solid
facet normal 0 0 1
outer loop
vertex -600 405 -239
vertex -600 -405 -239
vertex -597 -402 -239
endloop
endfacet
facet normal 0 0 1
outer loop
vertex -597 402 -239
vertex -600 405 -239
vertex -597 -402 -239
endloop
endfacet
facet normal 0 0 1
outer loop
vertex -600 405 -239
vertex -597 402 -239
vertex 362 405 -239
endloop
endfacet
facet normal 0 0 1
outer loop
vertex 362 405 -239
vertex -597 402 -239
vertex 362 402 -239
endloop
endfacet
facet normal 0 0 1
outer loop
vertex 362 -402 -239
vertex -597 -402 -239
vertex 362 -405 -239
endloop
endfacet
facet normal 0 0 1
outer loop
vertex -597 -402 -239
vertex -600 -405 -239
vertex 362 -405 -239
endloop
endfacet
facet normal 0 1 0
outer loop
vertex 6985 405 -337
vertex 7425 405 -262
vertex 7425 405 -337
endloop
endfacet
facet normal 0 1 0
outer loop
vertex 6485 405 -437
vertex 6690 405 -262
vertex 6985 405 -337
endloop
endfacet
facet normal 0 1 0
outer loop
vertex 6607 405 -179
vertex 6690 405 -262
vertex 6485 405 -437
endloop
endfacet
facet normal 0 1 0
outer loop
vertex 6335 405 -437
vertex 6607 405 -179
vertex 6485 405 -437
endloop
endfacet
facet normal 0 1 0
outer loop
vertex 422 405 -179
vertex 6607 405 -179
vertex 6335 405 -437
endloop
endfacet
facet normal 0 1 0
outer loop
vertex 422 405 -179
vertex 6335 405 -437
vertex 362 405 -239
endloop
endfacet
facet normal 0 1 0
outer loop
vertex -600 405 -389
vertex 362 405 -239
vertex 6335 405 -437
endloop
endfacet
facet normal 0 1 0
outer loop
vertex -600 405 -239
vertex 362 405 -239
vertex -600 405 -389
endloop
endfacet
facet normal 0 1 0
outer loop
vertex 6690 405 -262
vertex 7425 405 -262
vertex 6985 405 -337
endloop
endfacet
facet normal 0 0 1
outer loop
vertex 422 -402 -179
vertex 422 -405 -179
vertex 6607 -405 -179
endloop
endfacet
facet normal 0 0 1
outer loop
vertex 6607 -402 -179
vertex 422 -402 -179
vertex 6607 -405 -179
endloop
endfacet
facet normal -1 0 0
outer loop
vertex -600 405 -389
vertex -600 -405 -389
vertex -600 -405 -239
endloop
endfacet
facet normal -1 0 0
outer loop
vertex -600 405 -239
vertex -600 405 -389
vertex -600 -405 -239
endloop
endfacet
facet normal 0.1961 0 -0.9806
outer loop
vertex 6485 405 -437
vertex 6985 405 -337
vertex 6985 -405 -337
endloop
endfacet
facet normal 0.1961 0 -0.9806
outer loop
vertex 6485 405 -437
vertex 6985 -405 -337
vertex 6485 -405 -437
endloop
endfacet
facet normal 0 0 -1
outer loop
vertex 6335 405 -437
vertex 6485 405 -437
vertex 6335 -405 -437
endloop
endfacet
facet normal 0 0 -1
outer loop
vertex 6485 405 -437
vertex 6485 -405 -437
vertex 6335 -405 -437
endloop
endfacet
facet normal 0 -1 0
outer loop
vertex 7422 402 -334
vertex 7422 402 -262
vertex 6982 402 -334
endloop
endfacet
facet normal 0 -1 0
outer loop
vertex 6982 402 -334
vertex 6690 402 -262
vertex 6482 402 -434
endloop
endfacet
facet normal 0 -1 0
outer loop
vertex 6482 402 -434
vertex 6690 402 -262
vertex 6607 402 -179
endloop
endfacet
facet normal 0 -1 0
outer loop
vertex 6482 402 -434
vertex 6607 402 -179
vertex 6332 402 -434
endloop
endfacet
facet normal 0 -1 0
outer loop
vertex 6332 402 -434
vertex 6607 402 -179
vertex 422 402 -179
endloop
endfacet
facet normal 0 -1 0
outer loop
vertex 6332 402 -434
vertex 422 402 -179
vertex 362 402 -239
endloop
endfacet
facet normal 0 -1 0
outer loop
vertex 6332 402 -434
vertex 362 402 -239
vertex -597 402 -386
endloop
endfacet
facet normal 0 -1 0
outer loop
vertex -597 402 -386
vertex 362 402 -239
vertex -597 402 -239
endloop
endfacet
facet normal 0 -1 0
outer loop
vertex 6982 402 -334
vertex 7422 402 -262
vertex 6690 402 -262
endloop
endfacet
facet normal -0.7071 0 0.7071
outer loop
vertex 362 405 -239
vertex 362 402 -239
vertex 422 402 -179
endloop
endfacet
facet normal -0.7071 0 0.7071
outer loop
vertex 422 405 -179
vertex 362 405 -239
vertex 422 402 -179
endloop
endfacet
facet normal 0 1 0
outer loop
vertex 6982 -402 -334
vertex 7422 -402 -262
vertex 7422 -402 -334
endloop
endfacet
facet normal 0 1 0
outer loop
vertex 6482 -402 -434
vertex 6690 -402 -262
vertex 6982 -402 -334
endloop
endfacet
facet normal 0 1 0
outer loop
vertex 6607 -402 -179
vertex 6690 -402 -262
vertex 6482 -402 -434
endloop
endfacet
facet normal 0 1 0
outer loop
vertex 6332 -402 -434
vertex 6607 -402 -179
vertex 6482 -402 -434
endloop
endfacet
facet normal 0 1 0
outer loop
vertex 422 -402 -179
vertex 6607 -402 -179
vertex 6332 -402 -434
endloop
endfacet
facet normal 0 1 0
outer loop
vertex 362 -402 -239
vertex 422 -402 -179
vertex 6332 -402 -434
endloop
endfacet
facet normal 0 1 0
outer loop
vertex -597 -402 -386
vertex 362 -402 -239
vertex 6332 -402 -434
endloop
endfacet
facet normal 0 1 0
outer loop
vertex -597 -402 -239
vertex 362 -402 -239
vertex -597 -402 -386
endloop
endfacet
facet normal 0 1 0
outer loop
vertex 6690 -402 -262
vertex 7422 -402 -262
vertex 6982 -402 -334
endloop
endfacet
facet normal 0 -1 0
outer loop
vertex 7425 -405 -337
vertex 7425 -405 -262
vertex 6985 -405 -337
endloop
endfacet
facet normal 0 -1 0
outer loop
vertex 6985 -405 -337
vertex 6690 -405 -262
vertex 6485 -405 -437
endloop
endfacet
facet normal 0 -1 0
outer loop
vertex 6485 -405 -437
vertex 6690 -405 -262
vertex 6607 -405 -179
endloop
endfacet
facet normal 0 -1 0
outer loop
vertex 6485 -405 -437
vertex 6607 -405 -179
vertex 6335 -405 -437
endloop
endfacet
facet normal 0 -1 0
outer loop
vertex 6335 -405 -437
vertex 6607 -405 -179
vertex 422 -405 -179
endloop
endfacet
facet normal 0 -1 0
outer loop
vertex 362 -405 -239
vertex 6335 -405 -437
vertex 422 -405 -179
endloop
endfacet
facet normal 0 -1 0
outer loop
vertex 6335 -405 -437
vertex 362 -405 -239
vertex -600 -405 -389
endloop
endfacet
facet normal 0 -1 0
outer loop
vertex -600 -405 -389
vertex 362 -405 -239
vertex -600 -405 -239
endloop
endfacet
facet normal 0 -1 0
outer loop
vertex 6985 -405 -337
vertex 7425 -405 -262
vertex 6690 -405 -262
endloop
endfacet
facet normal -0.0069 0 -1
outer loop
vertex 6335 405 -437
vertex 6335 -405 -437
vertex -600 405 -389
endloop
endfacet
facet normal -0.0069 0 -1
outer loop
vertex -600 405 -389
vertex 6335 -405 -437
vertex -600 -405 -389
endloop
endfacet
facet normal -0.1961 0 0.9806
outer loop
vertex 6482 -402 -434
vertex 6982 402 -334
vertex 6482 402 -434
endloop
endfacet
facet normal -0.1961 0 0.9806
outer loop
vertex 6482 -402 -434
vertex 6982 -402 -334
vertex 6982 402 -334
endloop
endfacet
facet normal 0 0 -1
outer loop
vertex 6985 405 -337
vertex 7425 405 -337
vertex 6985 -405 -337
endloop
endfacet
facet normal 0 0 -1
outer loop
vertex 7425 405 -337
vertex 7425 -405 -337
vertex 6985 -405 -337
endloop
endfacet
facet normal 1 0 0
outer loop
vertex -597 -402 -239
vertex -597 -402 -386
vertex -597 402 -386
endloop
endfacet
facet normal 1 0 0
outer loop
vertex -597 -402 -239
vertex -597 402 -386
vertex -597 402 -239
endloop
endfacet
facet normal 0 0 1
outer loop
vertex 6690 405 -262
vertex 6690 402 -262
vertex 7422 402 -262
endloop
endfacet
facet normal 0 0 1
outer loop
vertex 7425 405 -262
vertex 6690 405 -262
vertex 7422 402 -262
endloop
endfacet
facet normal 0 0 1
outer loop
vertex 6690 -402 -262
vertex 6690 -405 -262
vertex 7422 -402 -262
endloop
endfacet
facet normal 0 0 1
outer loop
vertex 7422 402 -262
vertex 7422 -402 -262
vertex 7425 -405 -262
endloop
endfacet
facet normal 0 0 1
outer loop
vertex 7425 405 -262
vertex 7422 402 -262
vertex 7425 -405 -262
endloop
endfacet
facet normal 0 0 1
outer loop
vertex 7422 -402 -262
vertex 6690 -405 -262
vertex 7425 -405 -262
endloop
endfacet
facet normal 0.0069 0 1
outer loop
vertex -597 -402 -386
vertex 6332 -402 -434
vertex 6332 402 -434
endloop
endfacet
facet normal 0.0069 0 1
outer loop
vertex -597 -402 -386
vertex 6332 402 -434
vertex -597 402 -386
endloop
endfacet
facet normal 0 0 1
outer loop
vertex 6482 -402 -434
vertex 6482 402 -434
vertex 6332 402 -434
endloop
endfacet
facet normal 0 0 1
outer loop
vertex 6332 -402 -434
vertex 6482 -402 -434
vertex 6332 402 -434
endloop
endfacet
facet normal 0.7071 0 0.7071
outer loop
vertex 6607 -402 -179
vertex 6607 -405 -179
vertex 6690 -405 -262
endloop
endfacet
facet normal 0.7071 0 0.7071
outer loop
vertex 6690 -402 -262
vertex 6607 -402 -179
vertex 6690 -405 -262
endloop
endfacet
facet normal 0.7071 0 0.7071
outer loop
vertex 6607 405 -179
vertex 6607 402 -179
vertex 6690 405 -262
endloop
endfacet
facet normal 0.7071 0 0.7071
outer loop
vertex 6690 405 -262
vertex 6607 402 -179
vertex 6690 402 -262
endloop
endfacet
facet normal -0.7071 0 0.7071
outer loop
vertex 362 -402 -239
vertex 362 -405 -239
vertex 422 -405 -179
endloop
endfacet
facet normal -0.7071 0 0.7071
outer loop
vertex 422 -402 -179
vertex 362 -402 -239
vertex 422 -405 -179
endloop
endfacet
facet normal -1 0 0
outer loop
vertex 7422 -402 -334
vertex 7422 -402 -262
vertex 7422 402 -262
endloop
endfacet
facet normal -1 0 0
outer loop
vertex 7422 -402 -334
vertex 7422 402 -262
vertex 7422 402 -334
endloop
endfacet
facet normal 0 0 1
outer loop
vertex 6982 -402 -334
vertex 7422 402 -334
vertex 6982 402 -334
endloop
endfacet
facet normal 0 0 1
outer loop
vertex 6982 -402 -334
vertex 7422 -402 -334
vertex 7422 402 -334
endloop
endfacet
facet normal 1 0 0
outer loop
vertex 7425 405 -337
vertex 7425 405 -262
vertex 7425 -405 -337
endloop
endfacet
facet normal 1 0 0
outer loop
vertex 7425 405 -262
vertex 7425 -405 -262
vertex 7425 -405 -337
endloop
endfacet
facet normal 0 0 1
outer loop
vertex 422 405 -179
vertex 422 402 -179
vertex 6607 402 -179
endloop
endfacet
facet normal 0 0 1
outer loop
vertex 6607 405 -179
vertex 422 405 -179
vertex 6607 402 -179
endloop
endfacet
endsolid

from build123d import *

# Parameters (mm, degrees)
EXTRUDE032_DEPTH = 402
EXTRUDE015_DEPTH = 405


with BuildPart() as extrude032:
    # Sketch033 → Extrude032 (new body, symmetric)
    with BuildSketch(Plane.XZ):
        Polygon((-597, -239), (362, -239), (422, -179), (6604, -179), (6687, -262), (7422, -262), (7422, -337), (6982, -337), (6482, -437), (6332, -437), (-597, -389), align=None)
    extrude(amount=EXTRUDE032_DEPTH, both=True)


with BuildPart() as extrude032_1:
    # Extrude032 placement: moved
    add(extrude032.part.moved(Location((0, 0, 3))))


with BuildPart() as cut:
    # Sketch023 → Extrude015 (new body, symmetric)
    with BuildSketch(Plane.XZ):
        Polygon((-600, -239), (362, -239), (422, -179), (6607, -179), (6690, -262), (7425, -262), (7425, -337), (6985, -337), (6485, -437), (6335, -437), (-600, -389), align=None)
    extrude(amount=EXTRUDE015_DEPTH, both=True)

    # Cut: cut Extrude032
    add(extrude032_1.part, mode=Mode.SUBTRACT)


solid = cut.part
